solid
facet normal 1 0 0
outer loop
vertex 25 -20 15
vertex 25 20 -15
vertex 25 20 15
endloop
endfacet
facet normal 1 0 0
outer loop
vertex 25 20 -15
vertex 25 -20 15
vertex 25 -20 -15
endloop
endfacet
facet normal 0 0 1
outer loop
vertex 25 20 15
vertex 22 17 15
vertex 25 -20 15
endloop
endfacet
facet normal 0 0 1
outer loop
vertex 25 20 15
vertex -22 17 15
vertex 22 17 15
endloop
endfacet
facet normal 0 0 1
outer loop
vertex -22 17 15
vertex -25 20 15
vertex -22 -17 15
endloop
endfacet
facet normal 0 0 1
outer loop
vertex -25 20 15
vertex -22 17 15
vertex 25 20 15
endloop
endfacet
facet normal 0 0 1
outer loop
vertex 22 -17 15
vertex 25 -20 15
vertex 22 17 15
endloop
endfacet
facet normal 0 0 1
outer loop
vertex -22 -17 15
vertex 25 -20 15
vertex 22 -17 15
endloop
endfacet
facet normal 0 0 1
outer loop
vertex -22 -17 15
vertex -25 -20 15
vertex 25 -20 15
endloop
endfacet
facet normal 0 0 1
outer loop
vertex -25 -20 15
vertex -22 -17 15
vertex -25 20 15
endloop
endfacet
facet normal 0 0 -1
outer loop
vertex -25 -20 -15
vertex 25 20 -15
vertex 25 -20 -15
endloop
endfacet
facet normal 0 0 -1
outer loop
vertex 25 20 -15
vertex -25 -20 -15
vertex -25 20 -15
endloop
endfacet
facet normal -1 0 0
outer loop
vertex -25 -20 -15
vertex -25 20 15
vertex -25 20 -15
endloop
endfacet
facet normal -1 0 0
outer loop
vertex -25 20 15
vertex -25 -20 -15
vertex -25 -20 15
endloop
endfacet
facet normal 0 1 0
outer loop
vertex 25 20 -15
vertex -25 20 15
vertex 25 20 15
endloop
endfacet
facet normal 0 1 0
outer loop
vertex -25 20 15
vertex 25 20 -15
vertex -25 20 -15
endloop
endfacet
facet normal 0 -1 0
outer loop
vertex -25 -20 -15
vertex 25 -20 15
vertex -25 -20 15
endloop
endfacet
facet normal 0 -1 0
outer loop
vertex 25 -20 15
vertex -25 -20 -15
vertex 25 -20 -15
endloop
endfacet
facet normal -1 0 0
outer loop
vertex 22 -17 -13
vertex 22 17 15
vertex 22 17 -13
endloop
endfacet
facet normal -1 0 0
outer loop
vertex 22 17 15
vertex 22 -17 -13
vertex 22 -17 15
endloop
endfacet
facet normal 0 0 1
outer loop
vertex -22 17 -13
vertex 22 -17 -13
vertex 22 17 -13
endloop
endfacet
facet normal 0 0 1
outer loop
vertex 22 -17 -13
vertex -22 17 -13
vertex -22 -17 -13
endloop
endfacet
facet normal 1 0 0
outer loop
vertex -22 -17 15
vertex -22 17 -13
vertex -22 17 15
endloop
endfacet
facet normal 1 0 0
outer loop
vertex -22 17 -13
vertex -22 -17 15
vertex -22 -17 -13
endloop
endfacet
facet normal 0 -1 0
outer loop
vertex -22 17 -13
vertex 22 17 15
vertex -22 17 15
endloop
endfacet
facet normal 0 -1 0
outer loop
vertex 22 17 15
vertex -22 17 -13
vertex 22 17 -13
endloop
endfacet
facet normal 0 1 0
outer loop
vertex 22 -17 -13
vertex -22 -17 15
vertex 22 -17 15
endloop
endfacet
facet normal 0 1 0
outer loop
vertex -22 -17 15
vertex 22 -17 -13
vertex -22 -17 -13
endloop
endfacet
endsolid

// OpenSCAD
difference() {
	cube(center = true, size = [50, 40, 30]);
	translate(v = [0, 0, 2]) {
		cube(center = true, size = [44, 34, 30]);
	}
}
